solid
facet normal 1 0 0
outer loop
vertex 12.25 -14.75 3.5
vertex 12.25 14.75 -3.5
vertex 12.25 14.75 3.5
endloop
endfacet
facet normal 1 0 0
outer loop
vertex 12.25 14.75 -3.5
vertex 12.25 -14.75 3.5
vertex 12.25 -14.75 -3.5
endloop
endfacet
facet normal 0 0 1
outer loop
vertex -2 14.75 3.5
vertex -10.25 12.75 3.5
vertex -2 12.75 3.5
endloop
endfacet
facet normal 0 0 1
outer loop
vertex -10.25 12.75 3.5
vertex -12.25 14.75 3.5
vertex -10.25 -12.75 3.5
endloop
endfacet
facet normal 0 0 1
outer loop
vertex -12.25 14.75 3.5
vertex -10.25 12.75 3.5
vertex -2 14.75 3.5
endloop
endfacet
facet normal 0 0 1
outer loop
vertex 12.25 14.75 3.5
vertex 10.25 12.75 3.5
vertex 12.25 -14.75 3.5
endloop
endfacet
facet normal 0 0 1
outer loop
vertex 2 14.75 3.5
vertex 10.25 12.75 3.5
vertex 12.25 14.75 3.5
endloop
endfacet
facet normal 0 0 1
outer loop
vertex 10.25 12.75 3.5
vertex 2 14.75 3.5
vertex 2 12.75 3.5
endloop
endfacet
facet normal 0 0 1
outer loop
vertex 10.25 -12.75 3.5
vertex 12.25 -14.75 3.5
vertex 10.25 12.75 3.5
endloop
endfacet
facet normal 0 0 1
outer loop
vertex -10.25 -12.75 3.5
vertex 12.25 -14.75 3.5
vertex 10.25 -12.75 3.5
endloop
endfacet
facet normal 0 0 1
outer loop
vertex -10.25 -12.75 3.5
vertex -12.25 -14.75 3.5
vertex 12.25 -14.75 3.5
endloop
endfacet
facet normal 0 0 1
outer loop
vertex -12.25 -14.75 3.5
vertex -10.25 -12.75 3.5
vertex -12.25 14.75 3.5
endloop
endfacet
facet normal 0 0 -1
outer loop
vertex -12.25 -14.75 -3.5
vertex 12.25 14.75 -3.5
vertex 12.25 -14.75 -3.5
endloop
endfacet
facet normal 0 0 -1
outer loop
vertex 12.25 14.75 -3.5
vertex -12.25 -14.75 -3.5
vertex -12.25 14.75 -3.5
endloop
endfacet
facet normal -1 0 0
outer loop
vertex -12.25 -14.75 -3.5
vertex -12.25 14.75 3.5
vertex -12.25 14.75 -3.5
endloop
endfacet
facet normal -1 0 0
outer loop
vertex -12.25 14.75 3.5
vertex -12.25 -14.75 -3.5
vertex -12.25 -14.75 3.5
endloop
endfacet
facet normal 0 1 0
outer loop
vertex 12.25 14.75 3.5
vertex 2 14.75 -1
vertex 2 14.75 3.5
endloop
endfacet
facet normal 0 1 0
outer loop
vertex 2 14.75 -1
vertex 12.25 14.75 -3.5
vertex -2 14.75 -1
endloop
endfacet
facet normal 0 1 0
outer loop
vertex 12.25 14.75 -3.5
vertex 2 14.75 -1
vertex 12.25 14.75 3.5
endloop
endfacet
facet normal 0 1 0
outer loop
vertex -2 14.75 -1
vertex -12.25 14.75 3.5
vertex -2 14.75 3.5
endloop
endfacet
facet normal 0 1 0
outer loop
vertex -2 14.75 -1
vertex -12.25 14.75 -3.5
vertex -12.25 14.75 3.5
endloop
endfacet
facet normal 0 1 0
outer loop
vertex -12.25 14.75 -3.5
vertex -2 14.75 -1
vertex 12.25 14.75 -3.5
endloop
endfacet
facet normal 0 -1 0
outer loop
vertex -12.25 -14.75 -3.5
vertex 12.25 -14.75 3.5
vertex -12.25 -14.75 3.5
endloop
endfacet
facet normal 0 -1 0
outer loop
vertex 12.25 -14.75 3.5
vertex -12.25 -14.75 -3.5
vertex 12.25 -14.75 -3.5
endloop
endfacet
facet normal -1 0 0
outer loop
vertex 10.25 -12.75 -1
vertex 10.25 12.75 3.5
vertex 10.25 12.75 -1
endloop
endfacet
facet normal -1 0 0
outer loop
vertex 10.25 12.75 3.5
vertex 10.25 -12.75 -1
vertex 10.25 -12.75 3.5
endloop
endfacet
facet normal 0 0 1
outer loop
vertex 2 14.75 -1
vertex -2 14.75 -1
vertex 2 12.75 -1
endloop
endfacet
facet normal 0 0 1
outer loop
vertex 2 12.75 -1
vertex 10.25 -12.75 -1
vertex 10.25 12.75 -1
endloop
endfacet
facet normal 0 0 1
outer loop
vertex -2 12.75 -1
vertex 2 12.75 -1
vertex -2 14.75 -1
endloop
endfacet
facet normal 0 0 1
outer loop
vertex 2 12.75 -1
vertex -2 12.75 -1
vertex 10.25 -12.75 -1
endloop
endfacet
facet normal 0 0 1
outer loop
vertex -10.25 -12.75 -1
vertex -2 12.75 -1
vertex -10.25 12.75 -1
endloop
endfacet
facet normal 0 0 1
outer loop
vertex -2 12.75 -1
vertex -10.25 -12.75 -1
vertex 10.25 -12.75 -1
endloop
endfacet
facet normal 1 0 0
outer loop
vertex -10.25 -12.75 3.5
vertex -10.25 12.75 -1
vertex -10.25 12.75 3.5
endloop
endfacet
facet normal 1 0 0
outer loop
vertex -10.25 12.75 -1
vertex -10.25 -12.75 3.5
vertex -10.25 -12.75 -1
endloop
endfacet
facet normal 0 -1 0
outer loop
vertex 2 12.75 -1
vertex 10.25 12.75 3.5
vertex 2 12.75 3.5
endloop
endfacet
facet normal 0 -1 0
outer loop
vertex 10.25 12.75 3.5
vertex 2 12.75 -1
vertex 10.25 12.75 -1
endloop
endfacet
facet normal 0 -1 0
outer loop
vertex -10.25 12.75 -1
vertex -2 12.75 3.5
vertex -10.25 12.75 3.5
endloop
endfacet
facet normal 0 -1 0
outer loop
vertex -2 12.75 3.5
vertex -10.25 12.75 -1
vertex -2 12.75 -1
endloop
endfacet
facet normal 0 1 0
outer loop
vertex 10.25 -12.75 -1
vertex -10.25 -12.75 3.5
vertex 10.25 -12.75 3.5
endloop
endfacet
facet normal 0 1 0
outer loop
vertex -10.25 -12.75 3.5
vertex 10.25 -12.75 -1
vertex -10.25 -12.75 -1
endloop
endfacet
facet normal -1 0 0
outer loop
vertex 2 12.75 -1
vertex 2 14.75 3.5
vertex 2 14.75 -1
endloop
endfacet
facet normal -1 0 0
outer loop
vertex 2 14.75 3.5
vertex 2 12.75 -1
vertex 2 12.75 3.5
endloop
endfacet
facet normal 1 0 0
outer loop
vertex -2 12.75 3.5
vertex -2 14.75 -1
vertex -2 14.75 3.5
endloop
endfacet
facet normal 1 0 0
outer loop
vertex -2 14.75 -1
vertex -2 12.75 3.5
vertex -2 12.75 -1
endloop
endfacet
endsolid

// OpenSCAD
// Requires OpenSCAD 2016.3+

/* [Main] */

// select part
part = "assembly";
plateThickness = 2;

/* [Misc] */
// interference fit adjustment for 3D printer
iFitAdjust = .4;
// cylinder subtract height extension
cylHeightExt = .1; // for overcutting on differences so they render correctly, nothing more
// render quality
$fn = 64; // [24:low quality, 48:development, 64:production]

/* [ublox-neo6m] */
ubloxWidth = 20.5;
ubloxLength = 25.5;
ubloxHeight = 5;

render_part();

module render_part() {
	if (part == "assembly") {
		assembly();
	} else {
		// invalid value
	}
}

module assembly() {
    union() {
        difference() {
            cube([ubloxWidth + 2 * plateThickness,
                ubloxLength + 2 * plateThickness,
                ubloxHeight + plateThickness], center=true);
            translate([0, 0, plateThickness + .5])
                cube([ubloxWidth,
                    ubloxLength,
                    ubloxHeight + plateThickness], center=true);
            translate([0, ubloxLength / 2 + plateThickness - 1, 2 + plateThickness])
                #cube([4,
                    4,
                    10], center=true);
        }
    }
}
